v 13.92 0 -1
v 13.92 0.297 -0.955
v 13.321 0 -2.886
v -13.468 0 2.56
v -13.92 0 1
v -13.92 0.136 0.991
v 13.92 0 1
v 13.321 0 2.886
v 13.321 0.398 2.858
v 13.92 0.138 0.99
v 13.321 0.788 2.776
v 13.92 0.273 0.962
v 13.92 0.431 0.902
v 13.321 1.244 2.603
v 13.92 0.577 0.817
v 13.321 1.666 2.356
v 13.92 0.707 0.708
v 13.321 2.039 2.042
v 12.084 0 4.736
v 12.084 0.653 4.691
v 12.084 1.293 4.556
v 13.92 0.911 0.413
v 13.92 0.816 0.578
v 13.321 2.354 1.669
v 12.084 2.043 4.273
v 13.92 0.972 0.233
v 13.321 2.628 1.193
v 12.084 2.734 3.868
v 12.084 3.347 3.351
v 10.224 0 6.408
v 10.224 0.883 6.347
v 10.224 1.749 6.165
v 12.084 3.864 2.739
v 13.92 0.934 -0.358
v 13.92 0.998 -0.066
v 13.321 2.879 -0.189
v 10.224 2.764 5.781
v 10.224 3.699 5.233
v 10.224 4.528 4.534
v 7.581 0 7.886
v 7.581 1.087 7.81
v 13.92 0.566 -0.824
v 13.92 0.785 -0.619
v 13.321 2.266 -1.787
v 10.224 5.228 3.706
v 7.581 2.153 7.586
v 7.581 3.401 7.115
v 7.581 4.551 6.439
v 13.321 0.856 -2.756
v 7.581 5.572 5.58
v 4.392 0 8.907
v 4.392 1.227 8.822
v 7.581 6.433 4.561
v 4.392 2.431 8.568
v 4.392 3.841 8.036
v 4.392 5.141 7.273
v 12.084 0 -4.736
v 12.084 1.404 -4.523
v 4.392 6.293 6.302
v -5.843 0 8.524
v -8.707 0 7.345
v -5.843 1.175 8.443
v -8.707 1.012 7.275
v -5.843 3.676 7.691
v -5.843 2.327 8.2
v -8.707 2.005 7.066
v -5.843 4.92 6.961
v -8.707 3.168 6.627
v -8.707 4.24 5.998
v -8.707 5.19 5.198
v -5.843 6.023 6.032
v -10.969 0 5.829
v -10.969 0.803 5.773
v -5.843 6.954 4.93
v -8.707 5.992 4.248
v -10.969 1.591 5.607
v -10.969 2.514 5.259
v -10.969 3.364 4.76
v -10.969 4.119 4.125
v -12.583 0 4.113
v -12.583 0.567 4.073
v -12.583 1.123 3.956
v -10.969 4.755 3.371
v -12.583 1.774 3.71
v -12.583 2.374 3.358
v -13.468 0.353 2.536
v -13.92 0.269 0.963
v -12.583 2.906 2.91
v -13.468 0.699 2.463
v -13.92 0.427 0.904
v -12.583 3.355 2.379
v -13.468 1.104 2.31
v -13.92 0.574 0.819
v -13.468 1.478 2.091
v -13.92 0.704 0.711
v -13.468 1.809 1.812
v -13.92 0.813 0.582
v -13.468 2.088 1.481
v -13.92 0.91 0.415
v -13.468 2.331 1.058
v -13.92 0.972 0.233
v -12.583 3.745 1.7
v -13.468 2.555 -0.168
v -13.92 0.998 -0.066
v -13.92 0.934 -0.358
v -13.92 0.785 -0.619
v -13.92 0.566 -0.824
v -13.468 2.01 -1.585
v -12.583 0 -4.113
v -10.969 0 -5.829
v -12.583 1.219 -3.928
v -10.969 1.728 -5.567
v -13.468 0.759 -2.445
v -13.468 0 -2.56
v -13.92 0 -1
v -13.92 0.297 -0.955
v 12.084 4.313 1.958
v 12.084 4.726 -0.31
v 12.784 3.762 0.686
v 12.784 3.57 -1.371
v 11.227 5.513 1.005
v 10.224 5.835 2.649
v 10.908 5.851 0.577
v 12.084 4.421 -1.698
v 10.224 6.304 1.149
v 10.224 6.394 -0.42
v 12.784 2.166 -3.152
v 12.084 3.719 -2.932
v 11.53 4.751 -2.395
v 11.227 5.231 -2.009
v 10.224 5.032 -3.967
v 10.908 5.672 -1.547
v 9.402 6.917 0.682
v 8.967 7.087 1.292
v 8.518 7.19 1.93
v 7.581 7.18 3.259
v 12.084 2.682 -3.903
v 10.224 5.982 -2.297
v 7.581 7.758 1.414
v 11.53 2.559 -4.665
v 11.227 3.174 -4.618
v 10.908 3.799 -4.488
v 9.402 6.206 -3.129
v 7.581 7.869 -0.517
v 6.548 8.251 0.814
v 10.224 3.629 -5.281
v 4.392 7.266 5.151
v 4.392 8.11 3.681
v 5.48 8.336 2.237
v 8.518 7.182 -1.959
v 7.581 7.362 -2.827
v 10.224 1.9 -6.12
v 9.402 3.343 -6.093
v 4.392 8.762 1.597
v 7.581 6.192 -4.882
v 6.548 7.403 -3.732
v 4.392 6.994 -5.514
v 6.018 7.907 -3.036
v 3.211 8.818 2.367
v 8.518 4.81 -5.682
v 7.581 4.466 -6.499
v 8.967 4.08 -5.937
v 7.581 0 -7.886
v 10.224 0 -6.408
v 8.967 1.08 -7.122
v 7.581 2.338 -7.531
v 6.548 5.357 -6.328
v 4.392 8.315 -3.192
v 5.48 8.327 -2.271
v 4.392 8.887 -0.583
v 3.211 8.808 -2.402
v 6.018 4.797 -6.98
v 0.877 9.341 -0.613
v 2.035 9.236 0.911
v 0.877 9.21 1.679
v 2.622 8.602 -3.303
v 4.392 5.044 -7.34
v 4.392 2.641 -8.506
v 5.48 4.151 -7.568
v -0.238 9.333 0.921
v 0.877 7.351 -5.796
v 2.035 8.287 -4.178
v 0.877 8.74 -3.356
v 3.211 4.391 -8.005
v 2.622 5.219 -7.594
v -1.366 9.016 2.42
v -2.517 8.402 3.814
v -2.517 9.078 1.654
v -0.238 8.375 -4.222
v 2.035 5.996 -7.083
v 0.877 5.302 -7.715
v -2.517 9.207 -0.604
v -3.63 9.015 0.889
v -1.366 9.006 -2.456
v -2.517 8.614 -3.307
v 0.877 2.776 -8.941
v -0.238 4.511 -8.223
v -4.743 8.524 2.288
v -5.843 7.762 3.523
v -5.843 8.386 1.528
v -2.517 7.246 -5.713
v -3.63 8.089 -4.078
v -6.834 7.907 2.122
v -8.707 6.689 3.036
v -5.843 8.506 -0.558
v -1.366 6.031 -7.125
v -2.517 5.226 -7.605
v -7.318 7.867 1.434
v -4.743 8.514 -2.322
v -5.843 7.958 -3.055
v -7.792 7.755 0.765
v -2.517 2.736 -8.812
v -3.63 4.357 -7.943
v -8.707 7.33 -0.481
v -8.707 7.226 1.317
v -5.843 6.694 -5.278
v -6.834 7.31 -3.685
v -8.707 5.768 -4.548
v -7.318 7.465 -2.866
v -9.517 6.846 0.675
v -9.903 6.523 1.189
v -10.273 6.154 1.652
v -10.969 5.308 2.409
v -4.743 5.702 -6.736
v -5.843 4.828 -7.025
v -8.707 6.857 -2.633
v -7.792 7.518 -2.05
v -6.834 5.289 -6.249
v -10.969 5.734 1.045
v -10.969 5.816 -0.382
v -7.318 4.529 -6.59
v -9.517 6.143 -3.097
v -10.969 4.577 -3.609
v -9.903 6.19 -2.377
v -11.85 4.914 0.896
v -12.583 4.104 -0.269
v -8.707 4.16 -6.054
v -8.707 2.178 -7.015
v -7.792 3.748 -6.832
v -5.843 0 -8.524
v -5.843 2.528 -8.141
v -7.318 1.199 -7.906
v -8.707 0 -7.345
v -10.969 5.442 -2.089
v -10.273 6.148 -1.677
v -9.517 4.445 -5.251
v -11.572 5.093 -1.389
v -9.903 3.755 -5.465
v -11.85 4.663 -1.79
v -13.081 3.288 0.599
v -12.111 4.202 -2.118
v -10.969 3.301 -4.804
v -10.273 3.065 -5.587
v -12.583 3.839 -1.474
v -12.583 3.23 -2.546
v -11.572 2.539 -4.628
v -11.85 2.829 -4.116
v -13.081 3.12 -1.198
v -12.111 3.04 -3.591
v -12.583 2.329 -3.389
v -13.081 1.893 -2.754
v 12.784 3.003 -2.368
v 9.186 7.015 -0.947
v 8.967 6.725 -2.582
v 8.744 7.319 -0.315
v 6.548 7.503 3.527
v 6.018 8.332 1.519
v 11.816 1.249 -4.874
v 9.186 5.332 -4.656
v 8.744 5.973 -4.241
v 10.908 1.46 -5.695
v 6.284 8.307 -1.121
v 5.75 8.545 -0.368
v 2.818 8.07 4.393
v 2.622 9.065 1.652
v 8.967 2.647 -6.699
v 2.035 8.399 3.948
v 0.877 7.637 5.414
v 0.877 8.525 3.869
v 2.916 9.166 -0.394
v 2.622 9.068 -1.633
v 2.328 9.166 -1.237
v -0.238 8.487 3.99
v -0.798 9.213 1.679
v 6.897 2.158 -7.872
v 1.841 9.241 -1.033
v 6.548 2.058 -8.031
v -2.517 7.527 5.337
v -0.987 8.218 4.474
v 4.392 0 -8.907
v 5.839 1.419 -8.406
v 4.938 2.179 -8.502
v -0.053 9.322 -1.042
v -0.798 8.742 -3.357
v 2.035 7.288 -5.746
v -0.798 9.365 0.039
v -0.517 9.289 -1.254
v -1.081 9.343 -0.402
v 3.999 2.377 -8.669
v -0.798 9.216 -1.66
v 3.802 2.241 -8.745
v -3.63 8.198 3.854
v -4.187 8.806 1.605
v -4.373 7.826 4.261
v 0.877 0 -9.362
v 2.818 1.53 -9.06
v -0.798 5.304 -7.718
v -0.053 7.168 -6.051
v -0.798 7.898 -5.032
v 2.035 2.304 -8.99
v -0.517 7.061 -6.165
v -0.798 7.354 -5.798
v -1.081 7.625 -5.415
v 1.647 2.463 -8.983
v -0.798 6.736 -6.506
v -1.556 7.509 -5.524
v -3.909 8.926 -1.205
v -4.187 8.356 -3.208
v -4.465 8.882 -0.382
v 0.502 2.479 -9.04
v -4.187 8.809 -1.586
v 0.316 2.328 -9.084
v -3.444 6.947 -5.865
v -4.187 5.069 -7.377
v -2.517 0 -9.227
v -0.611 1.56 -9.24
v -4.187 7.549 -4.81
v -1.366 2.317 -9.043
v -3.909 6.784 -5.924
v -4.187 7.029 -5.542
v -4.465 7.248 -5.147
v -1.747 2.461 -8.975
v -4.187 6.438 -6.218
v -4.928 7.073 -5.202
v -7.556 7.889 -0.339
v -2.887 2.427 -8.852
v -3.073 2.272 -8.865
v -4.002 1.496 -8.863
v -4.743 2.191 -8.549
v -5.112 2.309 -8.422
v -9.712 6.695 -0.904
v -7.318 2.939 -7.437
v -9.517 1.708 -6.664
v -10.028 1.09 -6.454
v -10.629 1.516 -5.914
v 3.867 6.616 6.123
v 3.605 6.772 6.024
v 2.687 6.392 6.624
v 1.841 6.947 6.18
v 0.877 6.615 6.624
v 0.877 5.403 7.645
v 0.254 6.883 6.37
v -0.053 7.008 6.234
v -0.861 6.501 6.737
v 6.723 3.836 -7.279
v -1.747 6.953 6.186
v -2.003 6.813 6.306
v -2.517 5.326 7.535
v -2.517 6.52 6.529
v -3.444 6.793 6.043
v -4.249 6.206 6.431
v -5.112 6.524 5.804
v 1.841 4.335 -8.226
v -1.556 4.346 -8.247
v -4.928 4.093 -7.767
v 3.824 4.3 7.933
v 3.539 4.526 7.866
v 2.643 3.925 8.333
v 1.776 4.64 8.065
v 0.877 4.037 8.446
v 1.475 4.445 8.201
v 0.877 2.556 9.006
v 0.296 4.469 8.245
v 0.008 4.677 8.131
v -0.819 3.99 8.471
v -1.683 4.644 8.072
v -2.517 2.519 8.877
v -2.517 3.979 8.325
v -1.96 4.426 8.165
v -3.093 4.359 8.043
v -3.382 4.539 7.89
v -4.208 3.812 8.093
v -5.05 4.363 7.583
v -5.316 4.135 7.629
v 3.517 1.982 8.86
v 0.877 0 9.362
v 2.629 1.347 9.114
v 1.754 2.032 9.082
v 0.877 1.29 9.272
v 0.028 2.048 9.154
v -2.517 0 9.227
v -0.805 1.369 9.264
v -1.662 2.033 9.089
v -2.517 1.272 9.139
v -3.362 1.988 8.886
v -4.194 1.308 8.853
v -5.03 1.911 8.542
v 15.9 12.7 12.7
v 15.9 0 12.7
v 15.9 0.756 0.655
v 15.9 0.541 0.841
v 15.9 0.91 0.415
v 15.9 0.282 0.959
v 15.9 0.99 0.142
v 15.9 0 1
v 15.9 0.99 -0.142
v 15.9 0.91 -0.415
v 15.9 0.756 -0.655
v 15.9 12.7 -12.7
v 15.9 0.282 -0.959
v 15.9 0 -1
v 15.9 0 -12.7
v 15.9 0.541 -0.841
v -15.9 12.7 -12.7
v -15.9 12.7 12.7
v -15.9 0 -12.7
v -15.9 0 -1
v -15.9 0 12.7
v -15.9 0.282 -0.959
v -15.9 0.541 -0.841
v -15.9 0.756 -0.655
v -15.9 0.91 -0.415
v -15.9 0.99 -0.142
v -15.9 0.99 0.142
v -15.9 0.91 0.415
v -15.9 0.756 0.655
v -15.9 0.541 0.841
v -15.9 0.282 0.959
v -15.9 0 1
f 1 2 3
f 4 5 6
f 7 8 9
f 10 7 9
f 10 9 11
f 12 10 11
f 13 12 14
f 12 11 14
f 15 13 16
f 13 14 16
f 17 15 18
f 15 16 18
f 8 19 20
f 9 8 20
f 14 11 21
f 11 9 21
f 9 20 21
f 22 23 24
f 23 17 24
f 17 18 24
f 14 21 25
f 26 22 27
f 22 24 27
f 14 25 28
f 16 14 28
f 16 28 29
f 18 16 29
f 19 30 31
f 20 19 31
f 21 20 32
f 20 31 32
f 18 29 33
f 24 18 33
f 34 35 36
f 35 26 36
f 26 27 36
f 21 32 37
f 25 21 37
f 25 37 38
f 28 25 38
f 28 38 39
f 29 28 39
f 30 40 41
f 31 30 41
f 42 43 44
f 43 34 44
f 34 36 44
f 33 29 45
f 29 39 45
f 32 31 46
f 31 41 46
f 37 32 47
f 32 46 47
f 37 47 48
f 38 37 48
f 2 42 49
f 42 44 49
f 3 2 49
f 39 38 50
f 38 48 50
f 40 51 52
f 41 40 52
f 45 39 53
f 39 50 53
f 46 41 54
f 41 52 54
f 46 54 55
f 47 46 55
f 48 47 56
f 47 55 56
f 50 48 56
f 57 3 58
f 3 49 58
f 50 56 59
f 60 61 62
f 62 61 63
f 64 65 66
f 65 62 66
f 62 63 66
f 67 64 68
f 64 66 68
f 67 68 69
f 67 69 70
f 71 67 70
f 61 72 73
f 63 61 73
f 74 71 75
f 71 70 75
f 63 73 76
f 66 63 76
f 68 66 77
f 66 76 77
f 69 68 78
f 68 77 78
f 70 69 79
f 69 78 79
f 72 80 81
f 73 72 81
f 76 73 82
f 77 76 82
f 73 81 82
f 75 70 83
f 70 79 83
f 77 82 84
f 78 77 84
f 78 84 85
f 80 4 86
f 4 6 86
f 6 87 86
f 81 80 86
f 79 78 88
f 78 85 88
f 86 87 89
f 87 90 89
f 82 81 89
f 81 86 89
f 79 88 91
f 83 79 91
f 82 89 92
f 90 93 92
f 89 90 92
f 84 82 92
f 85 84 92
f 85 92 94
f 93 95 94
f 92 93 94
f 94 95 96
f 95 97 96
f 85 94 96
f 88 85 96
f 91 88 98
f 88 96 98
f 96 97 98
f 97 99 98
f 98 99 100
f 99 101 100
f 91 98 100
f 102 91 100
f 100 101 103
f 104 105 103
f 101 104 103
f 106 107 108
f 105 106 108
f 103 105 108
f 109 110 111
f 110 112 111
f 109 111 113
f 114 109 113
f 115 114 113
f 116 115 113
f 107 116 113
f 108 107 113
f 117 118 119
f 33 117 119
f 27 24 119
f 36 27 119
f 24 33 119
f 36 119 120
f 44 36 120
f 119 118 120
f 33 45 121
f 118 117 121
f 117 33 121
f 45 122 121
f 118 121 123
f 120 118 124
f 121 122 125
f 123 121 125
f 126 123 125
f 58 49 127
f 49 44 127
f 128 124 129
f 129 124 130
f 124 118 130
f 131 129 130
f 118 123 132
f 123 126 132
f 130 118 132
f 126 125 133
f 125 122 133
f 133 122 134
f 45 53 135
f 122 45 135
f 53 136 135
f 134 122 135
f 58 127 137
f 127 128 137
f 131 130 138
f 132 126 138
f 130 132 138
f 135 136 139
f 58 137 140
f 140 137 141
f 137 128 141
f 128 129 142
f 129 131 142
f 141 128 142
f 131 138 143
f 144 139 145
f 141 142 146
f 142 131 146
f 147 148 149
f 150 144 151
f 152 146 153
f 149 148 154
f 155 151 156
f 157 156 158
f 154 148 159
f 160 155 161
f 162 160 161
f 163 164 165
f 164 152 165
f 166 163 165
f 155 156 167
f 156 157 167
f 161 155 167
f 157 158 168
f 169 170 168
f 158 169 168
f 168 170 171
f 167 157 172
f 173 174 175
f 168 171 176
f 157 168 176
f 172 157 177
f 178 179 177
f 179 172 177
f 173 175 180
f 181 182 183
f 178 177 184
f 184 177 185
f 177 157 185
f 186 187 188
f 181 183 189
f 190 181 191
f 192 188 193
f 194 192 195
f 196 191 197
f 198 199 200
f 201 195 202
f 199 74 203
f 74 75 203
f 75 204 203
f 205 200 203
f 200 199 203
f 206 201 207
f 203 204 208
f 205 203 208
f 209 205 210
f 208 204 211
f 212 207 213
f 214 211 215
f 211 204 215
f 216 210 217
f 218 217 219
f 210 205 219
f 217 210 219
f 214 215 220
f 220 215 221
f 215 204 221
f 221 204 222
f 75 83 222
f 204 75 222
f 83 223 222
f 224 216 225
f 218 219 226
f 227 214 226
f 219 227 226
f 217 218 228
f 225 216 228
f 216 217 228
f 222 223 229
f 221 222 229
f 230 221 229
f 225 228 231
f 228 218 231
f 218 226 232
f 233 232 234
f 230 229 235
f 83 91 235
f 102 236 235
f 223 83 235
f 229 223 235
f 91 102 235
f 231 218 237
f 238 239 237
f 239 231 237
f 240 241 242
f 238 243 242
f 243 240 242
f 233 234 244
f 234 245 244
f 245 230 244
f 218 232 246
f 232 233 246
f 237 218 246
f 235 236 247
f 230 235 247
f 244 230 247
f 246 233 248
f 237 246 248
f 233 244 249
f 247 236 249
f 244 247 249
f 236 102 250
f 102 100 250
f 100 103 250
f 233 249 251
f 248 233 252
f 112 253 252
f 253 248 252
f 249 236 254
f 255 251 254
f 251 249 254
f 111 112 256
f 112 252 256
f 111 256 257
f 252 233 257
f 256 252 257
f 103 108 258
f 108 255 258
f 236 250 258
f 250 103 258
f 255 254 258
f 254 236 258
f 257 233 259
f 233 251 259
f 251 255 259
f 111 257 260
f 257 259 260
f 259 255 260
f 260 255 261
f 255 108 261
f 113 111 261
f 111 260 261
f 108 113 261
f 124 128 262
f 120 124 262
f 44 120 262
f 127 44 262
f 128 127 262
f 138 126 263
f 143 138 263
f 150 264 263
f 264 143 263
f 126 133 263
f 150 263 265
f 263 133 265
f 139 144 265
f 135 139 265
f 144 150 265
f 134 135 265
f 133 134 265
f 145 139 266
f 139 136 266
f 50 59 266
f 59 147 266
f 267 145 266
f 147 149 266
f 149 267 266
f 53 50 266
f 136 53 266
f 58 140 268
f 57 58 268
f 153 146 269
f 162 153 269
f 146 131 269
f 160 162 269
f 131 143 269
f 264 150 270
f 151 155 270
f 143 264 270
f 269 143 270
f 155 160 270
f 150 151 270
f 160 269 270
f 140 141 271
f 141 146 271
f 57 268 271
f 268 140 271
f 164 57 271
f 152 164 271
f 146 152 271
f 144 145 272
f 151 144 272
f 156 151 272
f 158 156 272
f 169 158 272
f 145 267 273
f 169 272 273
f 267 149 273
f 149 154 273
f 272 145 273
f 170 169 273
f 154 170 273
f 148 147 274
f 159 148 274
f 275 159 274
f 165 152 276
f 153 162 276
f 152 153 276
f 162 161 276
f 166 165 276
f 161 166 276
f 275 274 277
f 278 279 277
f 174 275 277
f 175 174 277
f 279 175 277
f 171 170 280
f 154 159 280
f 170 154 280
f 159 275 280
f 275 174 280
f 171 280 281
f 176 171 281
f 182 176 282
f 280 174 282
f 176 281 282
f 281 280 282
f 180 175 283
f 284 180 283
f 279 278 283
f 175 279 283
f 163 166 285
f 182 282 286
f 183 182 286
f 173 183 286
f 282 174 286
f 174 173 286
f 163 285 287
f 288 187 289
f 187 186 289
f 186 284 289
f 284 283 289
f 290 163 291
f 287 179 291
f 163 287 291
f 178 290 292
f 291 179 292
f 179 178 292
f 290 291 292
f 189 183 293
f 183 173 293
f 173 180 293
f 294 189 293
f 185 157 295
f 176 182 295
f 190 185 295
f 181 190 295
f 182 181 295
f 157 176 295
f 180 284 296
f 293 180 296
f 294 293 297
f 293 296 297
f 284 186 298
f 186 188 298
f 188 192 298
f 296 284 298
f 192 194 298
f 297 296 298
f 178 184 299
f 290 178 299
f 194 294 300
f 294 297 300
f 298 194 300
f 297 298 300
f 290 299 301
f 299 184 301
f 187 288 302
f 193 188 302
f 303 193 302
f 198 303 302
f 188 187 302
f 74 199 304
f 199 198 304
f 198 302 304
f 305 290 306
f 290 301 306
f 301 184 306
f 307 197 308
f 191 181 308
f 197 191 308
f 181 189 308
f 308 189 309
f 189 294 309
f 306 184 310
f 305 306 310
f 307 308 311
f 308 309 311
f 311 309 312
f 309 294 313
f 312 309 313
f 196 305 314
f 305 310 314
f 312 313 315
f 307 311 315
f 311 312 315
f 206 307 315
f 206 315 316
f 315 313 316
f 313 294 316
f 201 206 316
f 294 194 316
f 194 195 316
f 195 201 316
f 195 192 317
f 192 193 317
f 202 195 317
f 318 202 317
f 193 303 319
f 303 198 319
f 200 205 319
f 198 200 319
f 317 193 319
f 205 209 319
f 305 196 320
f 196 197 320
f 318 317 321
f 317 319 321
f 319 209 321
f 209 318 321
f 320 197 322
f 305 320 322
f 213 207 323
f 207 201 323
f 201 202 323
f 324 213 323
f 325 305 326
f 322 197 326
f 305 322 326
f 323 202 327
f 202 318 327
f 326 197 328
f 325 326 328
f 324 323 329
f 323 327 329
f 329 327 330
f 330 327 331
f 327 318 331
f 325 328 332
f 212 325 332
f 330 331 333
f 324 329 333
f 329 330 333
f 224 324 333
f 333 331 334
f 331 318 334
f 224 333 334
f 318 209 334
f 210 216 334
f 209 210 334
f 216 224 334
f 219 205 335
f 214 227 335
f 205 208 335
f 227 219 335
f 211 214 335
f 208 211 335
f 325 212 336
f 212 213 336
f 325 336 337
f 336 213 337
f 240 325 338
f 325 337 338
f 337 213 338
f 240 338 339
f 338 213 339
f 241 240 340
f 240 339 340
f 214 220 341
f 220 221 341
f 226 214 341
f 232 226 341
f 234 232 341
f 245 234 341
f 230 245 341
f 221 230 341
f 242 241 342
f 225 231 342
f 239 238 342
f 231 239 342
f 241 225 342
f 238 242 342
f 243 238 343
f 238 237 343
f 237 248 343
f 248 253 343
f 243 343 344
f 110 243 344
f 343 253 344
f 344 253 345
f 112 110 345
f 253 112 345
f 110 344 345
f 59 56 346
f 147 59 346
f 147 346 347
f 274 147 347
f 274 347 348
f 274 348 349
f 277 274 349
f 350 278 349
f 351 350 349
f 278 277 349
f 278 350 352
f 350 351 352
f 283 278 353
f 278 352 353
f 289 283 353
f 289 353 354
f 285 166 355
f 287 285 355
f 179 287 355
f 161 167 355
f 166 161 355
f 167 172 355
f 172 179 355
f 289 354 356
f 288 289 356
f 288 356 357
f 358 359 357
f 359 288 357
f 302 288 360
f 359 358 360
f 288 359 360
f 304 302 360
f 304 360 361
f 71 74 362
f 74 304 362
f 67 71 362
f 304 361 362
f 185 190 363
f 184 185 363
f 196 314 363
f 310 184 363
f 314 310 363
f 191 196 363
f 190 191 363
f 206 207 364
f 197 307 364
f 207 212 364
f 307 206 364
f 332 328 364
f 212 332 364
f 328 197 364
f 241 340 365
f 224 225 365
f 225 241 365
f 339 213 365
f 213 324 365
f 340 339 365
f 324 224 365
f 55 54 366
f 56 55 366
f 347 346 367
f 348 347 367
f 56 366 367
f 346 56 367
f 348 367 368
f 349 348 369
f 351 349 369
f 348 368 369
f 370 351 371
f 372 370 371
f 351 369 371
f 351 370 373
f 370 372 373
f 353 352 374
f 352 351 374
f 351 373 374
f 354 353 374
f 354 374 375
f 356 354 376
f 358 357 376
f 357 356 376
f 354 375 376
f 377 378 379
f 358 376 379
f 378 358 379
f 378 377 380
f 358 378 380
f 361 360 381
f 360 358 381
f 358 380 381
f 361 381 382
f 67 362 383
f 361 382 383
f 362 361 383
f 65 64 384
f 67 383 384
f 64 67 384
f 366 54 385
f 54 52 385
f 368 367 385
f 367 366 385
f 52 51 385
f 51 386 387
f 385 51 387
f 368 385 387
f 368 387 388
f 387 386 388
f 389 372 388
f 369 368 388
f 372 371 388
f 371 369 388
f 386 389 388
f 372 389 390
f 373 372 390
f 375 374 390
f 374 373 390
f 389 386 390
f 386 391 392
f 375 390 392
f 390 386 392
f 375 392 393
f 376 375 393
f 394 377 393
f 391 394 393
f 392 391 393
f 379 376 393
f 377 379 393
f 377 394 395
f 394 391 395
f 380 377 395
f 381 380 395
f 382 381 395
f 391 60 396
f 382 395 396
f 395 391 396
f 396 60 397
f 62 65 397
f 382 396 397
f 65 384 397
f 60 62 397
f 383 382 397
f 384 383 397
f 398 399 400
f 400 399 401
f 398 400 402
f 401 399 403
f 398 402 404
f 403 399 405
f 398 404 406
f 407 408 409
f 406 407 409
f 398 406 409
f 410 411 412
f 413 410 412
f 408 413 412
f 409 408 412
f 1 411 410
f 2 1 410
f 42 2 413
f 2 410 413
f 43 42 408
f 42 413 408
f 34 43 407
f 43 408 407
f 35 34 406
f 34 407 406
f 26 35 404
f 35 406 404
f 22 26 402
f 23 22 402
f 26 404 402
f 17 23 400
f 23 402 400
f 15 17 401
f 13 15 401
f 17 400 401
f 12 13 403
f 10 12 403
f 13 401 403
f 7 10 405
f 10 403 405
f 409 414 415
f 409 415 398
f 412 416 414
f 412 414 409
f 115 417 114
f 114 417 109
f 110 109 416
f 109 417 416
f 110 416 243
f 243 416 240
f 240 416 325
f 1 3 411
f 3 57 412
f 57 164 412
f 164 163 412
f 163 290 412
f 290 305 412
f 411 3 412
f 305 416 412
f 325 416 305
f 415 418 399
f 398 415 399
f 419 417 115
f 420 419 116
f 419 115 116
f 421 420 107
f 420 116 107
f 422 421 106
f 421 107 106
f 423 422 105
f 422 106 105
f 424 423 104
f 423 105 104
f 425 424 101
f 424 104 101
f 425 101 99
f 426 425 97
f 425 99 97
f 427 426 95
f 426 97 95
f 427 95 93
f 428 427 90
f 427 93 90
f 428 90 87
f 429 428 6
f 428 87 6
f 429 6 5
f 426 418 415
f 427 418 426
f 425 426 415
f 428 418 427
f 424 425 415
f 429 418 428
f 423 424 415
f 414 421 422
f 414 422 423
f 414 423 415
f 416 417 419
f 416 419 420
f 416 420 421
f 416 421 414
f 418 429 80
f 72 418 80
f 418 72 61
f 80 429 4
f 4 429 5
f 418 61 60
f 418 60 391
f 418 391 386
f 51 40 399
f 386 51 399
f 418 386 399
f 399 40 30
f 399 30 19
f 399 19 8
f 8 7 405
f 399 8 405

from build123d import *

# Parameters (mm, degrees)
SKETCH1_W           = 31.8
SKETCH1_H           = 25.4
BOSS_EXTRUDE1_DEPTH = 12.7
CUT_REVOLVE8_ANGLE  = 360
SKETCH7_R           = 1
CUT_EXTRUDE1_DEPTH  = 32.8000001


with BuildPart() as part:
    # Sketch1 → Boss-Extrude1 (new body)
    with BuildSketch(Plane(origin=(0, 0, 0), x_dir=(1, 0, 0), z_dir=(0, 1, 0))):
        Rectangle(SKETCH1_W, SKETCH1_H)
    extrude(amount=BOSS_EXTRUDE1_DEPTH)

    # Sketch2 → Cut-Revolve8 (revolve, symmetric, cut)
    with BuildSketch(Plane.XZ) as cut_revolve8_sk:
        with BuildLine():
            Line((-14, 0), (14, 0))
            add(Edge.make_bspline(
                [(14, 0), (14, 9.38), (0, 9.38)],
                knots=[3.141592654, 3.141592654, 3.141592654, 4.71238898, 4.71238898, 4.71238898], degree=2, weights=[1, 0.707106781, 1]))
            add(Edge.make_bspline(
                [(0, 9.38), (-14, 9.38), (-14, 0)],
                knots=[1.570796327, 1.570796327, 1.570796327, 3.141592654, 3.141592654, 3.141592654], degree=2, weights=[1, 0.707106781, 1]))
        make_face()
    revolve(axis=Axis((0, 0, 0), (1, 0, 0)), revolution_arc=CUT_REVOLVE8_ANGLE / 2, mode=Mode.SUBTRACT)
    revolve(cut_revolve8_sk.sketch, axis=Axis((0, 0, 0), (-1, 0, 0)), revolution_arc=CUT_REVOLVE8_ANGLE / 2, mode=Mode.SUBTRACT)

    # Sketch7 → Cut-Extrude1 (cut, through all)
    with BuildSketch(Plane(origin=(15.9, 0, 0), x_dir=(0, 0, -1), z_dir=(1, 0, 0))):
        Circle(SKETCH7_R)
    extrude(amount=-CUT_EXTRUDE1_DEPTH, mode=Mode.SUBTRACT)


solid = part.part
